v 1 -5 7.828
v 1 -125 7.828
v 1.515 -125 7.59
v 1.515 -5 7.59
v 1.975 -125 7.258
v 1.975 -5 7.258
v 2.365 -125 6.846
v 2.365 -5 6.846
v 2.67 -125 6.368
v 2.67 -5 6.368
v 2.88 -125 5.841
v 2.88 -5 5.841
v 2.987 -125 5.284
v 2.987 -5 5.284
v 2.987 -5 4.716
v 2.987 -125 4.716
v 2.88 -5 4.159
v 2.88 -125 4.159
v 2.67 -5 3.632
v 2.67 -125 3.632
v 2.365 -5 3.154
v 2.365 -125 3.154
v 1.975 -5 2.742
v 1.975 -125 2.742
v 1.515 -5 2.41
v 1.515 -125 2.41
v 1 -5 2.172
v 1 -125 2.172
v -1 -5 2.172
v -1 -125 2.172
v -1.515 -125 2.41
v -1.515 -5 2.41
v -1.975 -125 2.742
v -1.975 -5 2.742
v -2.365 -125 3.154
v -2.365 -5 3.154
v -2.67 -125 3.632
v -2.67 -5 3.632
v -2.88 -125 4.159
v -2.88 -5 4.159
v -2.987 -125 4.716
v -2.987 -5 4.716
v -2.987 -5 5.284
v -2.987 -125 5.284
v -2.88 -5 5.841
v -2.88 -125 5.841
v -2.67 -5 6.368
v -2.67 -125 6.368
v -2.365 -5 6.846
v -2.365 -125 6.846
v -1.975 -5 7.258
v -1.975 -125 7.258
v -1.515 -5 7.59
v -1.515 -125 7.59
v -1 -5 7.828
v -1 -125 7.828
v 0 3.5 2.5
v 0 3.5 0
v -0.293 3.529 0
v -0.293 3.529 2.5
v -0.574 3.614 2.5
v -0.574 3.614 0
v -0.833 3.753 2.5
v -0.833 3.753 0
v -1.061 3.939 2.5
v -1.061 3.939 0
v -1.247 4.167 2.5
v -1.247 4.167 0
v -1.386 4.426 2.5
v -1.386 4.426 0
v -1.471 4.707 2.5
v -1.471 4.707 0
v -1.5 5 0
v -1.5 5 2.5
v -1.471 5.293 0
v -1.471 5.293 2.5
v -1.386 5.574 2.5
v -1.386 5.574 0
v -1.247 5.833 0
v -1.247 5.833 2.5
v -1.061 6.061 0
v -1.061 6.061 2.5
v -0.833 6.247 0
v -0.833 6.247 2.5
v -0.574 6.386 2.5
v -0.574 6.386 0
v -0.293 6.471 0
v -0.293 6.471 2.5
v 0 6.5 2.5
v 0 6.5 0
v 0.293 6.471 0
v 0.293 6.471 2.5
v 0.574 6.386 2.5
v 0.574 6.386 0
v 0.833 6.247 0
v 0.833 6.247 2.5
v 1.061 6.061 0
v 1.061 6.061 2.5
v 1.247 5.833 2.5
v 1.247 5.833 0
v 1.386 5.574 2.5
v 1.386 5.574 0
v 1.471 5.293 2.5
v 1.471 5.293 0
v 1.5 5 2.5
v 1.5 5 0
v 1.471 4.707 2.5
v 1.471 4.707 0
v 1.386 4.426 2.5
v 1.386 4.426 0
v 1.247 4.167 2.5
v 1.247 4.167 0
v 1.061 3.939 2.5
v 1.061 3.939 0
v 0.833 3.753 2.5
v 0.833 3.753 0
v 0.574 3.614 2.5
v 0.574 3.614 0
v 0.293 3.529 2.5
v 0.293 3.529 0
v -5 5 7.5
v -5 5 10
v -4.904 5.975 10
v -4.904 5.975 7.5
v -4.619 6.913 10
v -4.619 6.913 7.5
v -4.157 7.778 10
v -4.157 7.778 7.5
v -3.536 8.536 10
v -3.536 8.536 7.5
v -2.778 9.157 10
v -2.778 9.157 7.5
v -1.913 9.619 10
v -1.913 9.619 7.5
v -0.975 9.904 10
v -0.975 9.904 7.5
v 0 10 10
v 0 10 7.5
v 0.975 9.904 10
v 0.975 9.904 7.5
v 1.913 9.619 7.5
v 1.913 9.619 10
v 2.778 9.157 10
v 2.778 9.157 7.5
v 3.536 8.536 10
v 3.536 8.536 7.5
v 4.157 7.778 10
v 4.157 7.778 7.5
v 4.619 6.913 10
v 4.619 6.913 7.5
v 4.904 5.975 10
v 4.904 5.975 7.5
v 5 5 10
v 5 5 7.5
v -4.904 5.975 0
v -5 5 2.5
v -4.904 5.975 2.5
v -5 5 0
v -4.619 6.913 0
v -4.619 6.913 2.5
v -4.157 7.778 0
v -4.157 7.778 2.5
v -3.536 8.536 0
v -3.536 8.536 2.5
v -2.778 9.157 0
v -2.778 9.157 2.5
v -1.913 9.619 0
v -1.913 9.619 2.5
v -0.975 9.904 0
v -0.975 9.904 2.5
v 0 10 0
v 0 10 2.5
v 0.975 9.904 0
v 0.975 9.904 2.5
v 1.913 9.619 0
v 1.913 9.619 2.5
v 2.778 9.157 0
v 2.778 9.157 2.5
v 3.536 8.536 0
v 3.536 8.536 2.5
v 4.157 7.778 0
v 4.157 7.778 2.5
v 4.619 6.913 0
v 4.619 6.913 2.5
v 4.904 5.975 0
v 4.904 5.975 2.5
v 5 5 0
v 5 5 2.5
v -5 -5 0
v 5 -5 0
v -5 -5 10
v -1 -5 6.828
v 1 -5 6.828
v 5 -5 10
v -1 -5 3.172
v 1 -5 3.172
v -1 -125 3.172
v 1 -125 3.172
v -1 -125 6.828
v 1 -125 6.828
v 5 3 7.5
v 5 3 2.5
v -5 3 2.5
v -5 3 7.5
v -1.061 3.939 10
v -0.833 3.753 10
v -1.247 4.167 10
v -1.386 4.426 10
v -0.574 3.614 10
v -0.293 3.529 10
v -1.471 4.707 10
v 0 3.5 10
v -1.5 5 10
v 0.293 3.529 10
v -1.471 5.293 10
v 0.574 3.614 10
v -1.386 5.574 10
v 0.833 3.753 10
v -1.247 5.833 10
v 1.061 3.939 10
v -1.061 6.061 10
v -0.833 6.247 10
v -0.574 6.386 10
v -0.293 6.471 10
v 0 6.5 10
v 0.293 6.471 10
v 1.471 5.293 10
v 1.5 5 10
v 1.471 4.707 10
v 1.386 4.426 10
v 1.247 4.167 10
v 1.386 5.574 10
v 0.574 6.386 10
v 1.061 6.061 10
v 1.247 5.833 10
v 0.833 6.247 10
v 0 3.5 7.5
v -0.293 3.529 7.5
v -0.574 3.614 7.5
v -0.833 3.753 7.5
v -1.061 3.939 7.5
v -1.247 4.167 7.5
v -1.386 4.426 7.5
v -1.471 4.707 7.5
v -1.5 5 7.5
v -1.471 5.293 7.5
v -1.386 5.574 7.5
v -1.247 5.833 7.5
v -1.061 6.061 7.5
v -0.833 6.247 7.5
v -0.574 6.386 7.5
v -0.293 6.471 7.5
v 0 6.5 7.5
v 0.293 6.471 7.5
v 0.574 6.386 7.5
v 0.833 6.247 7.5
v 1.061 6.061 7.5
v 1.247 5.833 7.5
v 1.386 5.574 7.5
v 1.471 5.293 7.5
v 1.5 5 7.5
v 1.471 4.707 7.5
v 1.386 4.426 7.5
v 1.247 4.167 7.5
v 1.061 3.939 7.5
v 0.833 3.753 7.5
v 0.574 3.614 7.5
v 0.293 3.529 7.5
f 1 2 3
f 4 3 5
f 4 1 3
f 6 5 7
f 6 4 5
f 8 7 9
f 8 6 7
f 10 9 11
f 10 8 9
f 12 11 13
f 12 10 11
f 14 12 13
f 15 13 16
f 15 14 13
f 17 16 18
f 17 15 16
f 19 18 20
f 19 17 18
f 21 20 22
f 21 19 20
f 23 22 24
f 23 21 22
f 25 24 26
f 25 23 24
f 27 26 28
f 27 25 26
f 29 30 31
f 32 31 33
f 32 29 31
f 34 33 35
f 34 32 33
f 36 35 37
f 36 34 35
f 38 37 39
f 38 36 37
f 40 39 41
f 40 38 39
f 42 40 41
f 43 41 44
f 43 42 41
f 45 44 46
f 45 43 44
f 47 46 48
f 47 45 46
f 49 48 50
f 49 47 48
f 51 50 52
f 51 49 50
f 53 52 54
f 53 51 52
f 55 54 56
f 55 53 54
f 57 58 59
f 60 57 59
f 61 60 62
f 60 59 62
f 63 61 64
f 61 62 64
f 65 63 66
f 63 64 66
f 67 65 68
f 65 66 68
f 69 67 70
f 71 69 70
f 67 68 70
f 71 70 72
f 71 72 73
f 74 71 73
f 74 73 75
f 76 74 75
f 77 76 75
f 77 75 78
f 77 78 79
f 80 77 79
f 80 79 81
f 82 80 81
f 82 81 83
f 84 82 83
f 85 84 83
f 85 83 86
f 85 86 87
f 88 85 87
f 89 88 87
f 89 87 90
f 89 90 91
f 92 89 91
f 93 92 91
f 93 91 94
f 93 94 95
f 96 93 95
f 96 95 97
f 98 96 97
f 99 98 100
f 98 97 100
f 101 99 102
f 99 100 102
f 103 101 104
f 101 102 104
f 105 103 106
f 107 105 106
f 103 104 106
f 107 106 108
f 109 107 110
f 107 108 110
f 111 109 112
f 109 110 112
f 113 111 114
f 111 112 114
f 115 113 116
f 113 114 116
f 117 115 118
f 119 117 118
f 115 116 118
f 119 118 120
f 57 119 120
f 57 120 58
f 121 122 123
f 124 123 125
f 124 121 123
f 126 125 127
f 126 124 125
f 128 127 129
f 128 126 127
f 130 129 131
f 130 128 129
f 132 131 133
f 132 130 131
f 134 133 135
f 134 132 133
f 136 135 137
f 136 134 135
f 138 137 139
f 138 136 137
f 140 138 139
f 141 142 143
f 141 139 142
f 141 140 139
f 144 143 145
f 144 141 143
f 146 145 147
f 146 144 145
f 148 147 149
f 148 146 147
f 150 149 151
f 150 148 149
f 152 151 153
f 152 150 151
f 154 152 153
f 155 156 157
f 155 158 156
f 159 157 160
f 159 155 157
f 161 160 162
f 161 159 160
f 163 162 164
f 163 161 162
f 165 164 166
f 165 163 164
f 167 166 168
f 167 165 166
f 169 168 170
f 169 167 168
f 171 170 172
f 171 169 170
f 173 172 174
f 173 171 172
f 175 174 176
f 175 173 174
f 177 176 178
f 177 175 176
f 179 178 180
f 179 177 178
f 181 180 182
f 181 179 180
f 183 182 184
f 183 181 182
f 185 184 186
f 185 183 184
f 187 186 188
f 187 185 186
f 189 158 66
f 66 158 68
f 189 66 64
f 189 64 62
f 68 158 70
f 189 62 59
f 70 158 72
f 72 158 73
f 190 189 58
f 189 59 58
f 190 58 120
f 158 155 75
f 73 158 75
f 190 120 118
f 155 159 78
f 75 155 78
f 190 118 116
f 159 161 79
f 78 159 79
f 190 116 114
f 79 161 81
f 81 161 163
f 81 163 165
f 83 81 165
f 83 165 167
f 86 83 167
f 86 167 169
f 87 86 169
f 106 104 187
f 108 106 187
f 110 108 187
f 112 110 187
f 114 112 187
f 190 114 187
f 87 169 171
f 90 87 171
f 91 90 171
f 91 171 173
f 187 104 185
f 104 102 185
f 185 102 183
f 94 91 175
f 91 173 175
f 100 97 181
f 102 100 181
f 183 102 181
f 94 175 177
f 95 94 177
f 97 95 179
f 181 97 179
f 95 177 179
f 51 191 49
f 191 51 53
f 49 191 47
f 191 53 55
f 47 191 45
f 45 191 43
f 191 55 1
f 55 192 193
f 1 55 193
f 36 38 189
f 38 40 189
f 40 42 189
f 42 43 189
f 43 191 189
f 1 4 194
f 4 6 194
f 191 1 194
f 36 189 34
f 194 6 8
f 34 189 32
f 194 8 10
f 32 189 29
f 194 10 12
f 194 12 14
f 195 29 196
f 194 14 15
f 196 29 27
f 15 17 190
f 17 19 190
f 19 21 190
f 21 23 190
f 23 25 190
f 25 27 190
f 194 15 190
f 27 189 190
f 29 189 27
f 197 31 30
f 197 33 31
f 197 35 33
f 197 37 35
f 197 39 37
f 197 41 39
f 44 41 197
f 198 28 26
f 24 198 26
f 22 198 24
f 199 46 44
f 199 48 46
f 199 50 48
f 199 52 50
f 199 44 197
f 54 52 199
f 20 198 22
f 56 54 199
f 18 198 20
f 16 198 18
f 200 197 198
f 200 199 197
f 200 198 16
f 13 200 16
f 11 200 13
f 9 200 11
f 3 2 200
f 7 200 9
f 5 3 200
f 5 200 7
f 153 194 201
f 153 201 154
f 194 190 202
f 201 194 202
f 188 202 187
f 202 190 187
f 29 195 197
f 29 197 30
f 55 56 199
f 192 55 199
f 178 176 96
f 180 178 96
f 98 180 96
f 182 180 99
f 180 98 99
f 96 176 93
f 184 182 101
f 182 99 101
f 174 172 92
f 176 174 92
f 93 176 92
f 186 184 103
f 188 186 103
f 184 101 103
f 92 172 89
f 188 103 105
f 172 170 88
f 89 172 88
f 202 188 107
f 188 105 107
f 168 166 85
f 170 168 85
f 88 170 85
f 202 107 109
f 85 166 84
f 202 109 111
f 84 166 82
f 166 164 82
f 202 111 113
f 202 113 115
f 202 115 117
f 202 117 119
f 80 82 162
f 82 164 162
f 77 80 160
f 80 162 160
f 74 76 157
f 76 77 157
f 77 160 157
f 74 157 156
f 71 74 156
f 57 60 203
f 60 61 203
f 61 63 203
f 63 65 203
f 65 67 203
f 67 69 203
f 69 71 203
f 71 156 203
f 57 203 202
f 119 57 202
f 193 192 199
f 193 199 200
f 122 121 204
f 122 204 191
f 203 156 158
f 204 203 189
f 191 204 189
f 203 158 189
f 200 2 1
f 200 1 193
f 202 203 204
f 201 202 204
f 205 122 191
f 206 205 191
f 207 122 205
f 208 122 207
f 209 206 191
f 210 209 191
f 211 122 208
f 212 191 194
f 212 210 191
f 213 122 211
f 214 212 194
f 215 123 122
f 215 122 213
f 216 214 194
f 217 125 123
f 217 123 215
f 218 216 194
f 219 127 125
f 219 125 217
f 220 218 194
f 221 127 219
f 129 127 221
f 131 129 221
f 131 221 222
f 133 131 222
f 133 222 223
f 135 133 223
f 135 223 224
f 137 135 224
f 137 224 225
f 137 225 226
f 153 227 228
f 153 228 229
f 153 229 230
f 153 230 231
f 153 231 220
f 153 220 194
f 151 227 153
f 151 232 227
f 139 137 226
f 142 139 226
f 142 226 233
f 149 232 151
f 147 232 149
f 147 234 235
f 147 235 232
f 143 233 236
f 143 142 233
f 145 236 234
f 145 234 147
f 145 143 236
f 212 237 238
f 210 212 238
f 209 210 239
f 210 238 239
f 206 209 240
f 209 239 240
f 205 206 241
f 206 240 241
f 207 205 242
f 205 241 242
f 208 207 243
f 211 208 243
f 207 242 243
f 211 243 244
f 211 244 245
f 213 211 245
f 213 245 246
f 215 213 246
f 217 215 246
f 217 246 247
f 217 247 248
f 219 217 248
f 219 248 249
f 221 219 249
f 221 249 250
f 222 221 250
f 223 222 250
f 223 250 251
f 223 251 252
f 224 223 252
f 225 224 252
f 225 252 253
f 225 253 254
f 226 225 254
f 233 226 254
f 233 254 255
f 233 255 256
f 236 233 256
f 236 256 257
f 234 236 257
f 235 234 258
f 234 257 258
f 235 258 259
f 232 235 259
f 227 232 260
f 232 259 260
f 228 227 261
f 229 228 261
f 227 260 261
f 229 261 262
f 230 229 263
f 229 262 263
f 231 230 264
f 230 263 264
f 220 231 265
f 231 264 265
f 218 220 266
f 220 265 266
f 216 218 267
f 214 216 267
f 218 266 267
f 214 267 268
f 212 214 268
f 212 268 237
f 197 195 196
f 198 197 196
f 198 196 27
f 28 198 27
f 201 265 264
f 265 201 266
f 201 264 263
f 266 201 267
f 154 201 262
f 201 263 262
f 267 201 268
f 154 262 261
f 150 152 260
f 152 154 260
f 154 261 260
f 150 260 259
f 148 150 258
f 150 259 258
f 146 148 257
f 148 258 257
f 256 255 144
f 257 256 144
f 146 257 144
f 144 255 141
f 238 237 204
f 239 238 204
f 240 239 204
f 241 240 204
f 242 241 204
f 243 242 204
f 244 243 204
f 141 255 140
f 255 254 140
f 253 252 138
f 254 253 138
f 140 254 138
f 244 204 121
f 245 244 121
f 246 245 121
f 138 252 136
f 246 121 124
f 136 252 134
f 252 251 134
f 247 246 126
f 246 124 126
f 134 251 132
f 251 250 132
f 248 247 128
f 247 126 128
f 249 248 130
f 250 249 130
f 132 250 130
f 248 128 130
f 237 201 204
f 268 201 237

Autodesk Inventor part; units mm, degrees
ref_plane "YZ Plane" through (0, 0, 0) normal (1, 0, 0) x (0, 1, 0)
ref_plane "XZ Plane" through (0, 0, 0) normal (0, 1, 0) x (-1, 0, 0)
ref_plane "XY Plane" through (0, 0, 0) normal (0, 0, 1) x (1, 0, 0)
sketch "Esquisse1" plane through (0, 0, 0) normal (0, 0, 1) x (1, 0, 0)
  line L0 (-5, -5) -> (5, -5)
  line L1 (5, -5) -> (5, 5)
  line L2 (5, 5) -> (-5, 5)
  line L3 (-5, 5) -> (-5, -5)
  line L4 (-5, -5) -> (5, 5) construction
  line L5 (5, -5) -> (-5, 5) construction
  arc A0 (5, 5) -> (-5, 5) centre (0, 5) ccw
  point P0 (0, 0)
  dimension "d0" = 10
  dimension "d1" = 10
extrude "Extrusion1" add sketch "Esquisse1" along normal blind 10
hole "Perçage1" at (0, 5, 10) direction (0, 0, -1) diameter 3 end through all
sketch "Esquisse3" plane through (0, 0, 0) normal (1, 0, 0) x (0, 1, 0)
  line L0 (15, 0) -> (15, 10)
  line L1 (3, 0) -> (3, 10)
  line L2 (15, 2.5) -> (3, 2.5)
  line L3 (3, 2.5) -> (3, 7.5)
  line L4 (3, 7.5) -> (15, 7.5)
  line L5 (15, 7.5) -> (15, 2.5)
  line L6 (15, 10) -> (3, 10)
  line L7 (15, 0) -> (3, 0)
  point P0 (0, 0)
  dimension "d23" = 12
  dimension "d29" = 5
  dimension "d30" = 2.5
extrude "Extrusion3" cut sketch "Esquisse3" along normal mid plane 100 contours L2 L1 L4 L0
sketch "Esquisse4" plane through (-5, -5, 0) normal (0, -1, 0) x (1, 0, 0)
  circle A0 centre (5, 5) radius 3
  line L0 (10, 0) -> (10, 10) projected
  line L1 (0, 10) -> (10, 10) projected
  line L2 (5, 8) -> (5, 2)
  line L3 (6, 7.8284) -> (6, 2.1716)
  line L4 (4, 7.8284) -> (4, 2.1716)
  line L5 (4, 6.8284) -> (6, 6.8284)
  line L6 (4, 3.1716) -> (6, 3.1716)
  point P0 (5, 0)
  point P1 (5, 6.8284)
  point P2 (4, 5)
  dimension "d24" = 6
  dimension "d25" = 5
  dimension "d26" = 5
  dimension "d37" = 2
  dimension "d38" = 1
  dimension "d39" = 1
  dimension "d40" = 1
  dimension "d41" = 1
extrude "Extrusion4" add sketch "Esquisse4" along normal blind 120
extrude "Extrusion5" cut sketch "Esquisse4" along normal through all contours L3 L5 L2 A0 | A0 L2 L6 L3 | L2 L5 L4 A0 | A0 L4 L6 L2
properties part number "Tige"
